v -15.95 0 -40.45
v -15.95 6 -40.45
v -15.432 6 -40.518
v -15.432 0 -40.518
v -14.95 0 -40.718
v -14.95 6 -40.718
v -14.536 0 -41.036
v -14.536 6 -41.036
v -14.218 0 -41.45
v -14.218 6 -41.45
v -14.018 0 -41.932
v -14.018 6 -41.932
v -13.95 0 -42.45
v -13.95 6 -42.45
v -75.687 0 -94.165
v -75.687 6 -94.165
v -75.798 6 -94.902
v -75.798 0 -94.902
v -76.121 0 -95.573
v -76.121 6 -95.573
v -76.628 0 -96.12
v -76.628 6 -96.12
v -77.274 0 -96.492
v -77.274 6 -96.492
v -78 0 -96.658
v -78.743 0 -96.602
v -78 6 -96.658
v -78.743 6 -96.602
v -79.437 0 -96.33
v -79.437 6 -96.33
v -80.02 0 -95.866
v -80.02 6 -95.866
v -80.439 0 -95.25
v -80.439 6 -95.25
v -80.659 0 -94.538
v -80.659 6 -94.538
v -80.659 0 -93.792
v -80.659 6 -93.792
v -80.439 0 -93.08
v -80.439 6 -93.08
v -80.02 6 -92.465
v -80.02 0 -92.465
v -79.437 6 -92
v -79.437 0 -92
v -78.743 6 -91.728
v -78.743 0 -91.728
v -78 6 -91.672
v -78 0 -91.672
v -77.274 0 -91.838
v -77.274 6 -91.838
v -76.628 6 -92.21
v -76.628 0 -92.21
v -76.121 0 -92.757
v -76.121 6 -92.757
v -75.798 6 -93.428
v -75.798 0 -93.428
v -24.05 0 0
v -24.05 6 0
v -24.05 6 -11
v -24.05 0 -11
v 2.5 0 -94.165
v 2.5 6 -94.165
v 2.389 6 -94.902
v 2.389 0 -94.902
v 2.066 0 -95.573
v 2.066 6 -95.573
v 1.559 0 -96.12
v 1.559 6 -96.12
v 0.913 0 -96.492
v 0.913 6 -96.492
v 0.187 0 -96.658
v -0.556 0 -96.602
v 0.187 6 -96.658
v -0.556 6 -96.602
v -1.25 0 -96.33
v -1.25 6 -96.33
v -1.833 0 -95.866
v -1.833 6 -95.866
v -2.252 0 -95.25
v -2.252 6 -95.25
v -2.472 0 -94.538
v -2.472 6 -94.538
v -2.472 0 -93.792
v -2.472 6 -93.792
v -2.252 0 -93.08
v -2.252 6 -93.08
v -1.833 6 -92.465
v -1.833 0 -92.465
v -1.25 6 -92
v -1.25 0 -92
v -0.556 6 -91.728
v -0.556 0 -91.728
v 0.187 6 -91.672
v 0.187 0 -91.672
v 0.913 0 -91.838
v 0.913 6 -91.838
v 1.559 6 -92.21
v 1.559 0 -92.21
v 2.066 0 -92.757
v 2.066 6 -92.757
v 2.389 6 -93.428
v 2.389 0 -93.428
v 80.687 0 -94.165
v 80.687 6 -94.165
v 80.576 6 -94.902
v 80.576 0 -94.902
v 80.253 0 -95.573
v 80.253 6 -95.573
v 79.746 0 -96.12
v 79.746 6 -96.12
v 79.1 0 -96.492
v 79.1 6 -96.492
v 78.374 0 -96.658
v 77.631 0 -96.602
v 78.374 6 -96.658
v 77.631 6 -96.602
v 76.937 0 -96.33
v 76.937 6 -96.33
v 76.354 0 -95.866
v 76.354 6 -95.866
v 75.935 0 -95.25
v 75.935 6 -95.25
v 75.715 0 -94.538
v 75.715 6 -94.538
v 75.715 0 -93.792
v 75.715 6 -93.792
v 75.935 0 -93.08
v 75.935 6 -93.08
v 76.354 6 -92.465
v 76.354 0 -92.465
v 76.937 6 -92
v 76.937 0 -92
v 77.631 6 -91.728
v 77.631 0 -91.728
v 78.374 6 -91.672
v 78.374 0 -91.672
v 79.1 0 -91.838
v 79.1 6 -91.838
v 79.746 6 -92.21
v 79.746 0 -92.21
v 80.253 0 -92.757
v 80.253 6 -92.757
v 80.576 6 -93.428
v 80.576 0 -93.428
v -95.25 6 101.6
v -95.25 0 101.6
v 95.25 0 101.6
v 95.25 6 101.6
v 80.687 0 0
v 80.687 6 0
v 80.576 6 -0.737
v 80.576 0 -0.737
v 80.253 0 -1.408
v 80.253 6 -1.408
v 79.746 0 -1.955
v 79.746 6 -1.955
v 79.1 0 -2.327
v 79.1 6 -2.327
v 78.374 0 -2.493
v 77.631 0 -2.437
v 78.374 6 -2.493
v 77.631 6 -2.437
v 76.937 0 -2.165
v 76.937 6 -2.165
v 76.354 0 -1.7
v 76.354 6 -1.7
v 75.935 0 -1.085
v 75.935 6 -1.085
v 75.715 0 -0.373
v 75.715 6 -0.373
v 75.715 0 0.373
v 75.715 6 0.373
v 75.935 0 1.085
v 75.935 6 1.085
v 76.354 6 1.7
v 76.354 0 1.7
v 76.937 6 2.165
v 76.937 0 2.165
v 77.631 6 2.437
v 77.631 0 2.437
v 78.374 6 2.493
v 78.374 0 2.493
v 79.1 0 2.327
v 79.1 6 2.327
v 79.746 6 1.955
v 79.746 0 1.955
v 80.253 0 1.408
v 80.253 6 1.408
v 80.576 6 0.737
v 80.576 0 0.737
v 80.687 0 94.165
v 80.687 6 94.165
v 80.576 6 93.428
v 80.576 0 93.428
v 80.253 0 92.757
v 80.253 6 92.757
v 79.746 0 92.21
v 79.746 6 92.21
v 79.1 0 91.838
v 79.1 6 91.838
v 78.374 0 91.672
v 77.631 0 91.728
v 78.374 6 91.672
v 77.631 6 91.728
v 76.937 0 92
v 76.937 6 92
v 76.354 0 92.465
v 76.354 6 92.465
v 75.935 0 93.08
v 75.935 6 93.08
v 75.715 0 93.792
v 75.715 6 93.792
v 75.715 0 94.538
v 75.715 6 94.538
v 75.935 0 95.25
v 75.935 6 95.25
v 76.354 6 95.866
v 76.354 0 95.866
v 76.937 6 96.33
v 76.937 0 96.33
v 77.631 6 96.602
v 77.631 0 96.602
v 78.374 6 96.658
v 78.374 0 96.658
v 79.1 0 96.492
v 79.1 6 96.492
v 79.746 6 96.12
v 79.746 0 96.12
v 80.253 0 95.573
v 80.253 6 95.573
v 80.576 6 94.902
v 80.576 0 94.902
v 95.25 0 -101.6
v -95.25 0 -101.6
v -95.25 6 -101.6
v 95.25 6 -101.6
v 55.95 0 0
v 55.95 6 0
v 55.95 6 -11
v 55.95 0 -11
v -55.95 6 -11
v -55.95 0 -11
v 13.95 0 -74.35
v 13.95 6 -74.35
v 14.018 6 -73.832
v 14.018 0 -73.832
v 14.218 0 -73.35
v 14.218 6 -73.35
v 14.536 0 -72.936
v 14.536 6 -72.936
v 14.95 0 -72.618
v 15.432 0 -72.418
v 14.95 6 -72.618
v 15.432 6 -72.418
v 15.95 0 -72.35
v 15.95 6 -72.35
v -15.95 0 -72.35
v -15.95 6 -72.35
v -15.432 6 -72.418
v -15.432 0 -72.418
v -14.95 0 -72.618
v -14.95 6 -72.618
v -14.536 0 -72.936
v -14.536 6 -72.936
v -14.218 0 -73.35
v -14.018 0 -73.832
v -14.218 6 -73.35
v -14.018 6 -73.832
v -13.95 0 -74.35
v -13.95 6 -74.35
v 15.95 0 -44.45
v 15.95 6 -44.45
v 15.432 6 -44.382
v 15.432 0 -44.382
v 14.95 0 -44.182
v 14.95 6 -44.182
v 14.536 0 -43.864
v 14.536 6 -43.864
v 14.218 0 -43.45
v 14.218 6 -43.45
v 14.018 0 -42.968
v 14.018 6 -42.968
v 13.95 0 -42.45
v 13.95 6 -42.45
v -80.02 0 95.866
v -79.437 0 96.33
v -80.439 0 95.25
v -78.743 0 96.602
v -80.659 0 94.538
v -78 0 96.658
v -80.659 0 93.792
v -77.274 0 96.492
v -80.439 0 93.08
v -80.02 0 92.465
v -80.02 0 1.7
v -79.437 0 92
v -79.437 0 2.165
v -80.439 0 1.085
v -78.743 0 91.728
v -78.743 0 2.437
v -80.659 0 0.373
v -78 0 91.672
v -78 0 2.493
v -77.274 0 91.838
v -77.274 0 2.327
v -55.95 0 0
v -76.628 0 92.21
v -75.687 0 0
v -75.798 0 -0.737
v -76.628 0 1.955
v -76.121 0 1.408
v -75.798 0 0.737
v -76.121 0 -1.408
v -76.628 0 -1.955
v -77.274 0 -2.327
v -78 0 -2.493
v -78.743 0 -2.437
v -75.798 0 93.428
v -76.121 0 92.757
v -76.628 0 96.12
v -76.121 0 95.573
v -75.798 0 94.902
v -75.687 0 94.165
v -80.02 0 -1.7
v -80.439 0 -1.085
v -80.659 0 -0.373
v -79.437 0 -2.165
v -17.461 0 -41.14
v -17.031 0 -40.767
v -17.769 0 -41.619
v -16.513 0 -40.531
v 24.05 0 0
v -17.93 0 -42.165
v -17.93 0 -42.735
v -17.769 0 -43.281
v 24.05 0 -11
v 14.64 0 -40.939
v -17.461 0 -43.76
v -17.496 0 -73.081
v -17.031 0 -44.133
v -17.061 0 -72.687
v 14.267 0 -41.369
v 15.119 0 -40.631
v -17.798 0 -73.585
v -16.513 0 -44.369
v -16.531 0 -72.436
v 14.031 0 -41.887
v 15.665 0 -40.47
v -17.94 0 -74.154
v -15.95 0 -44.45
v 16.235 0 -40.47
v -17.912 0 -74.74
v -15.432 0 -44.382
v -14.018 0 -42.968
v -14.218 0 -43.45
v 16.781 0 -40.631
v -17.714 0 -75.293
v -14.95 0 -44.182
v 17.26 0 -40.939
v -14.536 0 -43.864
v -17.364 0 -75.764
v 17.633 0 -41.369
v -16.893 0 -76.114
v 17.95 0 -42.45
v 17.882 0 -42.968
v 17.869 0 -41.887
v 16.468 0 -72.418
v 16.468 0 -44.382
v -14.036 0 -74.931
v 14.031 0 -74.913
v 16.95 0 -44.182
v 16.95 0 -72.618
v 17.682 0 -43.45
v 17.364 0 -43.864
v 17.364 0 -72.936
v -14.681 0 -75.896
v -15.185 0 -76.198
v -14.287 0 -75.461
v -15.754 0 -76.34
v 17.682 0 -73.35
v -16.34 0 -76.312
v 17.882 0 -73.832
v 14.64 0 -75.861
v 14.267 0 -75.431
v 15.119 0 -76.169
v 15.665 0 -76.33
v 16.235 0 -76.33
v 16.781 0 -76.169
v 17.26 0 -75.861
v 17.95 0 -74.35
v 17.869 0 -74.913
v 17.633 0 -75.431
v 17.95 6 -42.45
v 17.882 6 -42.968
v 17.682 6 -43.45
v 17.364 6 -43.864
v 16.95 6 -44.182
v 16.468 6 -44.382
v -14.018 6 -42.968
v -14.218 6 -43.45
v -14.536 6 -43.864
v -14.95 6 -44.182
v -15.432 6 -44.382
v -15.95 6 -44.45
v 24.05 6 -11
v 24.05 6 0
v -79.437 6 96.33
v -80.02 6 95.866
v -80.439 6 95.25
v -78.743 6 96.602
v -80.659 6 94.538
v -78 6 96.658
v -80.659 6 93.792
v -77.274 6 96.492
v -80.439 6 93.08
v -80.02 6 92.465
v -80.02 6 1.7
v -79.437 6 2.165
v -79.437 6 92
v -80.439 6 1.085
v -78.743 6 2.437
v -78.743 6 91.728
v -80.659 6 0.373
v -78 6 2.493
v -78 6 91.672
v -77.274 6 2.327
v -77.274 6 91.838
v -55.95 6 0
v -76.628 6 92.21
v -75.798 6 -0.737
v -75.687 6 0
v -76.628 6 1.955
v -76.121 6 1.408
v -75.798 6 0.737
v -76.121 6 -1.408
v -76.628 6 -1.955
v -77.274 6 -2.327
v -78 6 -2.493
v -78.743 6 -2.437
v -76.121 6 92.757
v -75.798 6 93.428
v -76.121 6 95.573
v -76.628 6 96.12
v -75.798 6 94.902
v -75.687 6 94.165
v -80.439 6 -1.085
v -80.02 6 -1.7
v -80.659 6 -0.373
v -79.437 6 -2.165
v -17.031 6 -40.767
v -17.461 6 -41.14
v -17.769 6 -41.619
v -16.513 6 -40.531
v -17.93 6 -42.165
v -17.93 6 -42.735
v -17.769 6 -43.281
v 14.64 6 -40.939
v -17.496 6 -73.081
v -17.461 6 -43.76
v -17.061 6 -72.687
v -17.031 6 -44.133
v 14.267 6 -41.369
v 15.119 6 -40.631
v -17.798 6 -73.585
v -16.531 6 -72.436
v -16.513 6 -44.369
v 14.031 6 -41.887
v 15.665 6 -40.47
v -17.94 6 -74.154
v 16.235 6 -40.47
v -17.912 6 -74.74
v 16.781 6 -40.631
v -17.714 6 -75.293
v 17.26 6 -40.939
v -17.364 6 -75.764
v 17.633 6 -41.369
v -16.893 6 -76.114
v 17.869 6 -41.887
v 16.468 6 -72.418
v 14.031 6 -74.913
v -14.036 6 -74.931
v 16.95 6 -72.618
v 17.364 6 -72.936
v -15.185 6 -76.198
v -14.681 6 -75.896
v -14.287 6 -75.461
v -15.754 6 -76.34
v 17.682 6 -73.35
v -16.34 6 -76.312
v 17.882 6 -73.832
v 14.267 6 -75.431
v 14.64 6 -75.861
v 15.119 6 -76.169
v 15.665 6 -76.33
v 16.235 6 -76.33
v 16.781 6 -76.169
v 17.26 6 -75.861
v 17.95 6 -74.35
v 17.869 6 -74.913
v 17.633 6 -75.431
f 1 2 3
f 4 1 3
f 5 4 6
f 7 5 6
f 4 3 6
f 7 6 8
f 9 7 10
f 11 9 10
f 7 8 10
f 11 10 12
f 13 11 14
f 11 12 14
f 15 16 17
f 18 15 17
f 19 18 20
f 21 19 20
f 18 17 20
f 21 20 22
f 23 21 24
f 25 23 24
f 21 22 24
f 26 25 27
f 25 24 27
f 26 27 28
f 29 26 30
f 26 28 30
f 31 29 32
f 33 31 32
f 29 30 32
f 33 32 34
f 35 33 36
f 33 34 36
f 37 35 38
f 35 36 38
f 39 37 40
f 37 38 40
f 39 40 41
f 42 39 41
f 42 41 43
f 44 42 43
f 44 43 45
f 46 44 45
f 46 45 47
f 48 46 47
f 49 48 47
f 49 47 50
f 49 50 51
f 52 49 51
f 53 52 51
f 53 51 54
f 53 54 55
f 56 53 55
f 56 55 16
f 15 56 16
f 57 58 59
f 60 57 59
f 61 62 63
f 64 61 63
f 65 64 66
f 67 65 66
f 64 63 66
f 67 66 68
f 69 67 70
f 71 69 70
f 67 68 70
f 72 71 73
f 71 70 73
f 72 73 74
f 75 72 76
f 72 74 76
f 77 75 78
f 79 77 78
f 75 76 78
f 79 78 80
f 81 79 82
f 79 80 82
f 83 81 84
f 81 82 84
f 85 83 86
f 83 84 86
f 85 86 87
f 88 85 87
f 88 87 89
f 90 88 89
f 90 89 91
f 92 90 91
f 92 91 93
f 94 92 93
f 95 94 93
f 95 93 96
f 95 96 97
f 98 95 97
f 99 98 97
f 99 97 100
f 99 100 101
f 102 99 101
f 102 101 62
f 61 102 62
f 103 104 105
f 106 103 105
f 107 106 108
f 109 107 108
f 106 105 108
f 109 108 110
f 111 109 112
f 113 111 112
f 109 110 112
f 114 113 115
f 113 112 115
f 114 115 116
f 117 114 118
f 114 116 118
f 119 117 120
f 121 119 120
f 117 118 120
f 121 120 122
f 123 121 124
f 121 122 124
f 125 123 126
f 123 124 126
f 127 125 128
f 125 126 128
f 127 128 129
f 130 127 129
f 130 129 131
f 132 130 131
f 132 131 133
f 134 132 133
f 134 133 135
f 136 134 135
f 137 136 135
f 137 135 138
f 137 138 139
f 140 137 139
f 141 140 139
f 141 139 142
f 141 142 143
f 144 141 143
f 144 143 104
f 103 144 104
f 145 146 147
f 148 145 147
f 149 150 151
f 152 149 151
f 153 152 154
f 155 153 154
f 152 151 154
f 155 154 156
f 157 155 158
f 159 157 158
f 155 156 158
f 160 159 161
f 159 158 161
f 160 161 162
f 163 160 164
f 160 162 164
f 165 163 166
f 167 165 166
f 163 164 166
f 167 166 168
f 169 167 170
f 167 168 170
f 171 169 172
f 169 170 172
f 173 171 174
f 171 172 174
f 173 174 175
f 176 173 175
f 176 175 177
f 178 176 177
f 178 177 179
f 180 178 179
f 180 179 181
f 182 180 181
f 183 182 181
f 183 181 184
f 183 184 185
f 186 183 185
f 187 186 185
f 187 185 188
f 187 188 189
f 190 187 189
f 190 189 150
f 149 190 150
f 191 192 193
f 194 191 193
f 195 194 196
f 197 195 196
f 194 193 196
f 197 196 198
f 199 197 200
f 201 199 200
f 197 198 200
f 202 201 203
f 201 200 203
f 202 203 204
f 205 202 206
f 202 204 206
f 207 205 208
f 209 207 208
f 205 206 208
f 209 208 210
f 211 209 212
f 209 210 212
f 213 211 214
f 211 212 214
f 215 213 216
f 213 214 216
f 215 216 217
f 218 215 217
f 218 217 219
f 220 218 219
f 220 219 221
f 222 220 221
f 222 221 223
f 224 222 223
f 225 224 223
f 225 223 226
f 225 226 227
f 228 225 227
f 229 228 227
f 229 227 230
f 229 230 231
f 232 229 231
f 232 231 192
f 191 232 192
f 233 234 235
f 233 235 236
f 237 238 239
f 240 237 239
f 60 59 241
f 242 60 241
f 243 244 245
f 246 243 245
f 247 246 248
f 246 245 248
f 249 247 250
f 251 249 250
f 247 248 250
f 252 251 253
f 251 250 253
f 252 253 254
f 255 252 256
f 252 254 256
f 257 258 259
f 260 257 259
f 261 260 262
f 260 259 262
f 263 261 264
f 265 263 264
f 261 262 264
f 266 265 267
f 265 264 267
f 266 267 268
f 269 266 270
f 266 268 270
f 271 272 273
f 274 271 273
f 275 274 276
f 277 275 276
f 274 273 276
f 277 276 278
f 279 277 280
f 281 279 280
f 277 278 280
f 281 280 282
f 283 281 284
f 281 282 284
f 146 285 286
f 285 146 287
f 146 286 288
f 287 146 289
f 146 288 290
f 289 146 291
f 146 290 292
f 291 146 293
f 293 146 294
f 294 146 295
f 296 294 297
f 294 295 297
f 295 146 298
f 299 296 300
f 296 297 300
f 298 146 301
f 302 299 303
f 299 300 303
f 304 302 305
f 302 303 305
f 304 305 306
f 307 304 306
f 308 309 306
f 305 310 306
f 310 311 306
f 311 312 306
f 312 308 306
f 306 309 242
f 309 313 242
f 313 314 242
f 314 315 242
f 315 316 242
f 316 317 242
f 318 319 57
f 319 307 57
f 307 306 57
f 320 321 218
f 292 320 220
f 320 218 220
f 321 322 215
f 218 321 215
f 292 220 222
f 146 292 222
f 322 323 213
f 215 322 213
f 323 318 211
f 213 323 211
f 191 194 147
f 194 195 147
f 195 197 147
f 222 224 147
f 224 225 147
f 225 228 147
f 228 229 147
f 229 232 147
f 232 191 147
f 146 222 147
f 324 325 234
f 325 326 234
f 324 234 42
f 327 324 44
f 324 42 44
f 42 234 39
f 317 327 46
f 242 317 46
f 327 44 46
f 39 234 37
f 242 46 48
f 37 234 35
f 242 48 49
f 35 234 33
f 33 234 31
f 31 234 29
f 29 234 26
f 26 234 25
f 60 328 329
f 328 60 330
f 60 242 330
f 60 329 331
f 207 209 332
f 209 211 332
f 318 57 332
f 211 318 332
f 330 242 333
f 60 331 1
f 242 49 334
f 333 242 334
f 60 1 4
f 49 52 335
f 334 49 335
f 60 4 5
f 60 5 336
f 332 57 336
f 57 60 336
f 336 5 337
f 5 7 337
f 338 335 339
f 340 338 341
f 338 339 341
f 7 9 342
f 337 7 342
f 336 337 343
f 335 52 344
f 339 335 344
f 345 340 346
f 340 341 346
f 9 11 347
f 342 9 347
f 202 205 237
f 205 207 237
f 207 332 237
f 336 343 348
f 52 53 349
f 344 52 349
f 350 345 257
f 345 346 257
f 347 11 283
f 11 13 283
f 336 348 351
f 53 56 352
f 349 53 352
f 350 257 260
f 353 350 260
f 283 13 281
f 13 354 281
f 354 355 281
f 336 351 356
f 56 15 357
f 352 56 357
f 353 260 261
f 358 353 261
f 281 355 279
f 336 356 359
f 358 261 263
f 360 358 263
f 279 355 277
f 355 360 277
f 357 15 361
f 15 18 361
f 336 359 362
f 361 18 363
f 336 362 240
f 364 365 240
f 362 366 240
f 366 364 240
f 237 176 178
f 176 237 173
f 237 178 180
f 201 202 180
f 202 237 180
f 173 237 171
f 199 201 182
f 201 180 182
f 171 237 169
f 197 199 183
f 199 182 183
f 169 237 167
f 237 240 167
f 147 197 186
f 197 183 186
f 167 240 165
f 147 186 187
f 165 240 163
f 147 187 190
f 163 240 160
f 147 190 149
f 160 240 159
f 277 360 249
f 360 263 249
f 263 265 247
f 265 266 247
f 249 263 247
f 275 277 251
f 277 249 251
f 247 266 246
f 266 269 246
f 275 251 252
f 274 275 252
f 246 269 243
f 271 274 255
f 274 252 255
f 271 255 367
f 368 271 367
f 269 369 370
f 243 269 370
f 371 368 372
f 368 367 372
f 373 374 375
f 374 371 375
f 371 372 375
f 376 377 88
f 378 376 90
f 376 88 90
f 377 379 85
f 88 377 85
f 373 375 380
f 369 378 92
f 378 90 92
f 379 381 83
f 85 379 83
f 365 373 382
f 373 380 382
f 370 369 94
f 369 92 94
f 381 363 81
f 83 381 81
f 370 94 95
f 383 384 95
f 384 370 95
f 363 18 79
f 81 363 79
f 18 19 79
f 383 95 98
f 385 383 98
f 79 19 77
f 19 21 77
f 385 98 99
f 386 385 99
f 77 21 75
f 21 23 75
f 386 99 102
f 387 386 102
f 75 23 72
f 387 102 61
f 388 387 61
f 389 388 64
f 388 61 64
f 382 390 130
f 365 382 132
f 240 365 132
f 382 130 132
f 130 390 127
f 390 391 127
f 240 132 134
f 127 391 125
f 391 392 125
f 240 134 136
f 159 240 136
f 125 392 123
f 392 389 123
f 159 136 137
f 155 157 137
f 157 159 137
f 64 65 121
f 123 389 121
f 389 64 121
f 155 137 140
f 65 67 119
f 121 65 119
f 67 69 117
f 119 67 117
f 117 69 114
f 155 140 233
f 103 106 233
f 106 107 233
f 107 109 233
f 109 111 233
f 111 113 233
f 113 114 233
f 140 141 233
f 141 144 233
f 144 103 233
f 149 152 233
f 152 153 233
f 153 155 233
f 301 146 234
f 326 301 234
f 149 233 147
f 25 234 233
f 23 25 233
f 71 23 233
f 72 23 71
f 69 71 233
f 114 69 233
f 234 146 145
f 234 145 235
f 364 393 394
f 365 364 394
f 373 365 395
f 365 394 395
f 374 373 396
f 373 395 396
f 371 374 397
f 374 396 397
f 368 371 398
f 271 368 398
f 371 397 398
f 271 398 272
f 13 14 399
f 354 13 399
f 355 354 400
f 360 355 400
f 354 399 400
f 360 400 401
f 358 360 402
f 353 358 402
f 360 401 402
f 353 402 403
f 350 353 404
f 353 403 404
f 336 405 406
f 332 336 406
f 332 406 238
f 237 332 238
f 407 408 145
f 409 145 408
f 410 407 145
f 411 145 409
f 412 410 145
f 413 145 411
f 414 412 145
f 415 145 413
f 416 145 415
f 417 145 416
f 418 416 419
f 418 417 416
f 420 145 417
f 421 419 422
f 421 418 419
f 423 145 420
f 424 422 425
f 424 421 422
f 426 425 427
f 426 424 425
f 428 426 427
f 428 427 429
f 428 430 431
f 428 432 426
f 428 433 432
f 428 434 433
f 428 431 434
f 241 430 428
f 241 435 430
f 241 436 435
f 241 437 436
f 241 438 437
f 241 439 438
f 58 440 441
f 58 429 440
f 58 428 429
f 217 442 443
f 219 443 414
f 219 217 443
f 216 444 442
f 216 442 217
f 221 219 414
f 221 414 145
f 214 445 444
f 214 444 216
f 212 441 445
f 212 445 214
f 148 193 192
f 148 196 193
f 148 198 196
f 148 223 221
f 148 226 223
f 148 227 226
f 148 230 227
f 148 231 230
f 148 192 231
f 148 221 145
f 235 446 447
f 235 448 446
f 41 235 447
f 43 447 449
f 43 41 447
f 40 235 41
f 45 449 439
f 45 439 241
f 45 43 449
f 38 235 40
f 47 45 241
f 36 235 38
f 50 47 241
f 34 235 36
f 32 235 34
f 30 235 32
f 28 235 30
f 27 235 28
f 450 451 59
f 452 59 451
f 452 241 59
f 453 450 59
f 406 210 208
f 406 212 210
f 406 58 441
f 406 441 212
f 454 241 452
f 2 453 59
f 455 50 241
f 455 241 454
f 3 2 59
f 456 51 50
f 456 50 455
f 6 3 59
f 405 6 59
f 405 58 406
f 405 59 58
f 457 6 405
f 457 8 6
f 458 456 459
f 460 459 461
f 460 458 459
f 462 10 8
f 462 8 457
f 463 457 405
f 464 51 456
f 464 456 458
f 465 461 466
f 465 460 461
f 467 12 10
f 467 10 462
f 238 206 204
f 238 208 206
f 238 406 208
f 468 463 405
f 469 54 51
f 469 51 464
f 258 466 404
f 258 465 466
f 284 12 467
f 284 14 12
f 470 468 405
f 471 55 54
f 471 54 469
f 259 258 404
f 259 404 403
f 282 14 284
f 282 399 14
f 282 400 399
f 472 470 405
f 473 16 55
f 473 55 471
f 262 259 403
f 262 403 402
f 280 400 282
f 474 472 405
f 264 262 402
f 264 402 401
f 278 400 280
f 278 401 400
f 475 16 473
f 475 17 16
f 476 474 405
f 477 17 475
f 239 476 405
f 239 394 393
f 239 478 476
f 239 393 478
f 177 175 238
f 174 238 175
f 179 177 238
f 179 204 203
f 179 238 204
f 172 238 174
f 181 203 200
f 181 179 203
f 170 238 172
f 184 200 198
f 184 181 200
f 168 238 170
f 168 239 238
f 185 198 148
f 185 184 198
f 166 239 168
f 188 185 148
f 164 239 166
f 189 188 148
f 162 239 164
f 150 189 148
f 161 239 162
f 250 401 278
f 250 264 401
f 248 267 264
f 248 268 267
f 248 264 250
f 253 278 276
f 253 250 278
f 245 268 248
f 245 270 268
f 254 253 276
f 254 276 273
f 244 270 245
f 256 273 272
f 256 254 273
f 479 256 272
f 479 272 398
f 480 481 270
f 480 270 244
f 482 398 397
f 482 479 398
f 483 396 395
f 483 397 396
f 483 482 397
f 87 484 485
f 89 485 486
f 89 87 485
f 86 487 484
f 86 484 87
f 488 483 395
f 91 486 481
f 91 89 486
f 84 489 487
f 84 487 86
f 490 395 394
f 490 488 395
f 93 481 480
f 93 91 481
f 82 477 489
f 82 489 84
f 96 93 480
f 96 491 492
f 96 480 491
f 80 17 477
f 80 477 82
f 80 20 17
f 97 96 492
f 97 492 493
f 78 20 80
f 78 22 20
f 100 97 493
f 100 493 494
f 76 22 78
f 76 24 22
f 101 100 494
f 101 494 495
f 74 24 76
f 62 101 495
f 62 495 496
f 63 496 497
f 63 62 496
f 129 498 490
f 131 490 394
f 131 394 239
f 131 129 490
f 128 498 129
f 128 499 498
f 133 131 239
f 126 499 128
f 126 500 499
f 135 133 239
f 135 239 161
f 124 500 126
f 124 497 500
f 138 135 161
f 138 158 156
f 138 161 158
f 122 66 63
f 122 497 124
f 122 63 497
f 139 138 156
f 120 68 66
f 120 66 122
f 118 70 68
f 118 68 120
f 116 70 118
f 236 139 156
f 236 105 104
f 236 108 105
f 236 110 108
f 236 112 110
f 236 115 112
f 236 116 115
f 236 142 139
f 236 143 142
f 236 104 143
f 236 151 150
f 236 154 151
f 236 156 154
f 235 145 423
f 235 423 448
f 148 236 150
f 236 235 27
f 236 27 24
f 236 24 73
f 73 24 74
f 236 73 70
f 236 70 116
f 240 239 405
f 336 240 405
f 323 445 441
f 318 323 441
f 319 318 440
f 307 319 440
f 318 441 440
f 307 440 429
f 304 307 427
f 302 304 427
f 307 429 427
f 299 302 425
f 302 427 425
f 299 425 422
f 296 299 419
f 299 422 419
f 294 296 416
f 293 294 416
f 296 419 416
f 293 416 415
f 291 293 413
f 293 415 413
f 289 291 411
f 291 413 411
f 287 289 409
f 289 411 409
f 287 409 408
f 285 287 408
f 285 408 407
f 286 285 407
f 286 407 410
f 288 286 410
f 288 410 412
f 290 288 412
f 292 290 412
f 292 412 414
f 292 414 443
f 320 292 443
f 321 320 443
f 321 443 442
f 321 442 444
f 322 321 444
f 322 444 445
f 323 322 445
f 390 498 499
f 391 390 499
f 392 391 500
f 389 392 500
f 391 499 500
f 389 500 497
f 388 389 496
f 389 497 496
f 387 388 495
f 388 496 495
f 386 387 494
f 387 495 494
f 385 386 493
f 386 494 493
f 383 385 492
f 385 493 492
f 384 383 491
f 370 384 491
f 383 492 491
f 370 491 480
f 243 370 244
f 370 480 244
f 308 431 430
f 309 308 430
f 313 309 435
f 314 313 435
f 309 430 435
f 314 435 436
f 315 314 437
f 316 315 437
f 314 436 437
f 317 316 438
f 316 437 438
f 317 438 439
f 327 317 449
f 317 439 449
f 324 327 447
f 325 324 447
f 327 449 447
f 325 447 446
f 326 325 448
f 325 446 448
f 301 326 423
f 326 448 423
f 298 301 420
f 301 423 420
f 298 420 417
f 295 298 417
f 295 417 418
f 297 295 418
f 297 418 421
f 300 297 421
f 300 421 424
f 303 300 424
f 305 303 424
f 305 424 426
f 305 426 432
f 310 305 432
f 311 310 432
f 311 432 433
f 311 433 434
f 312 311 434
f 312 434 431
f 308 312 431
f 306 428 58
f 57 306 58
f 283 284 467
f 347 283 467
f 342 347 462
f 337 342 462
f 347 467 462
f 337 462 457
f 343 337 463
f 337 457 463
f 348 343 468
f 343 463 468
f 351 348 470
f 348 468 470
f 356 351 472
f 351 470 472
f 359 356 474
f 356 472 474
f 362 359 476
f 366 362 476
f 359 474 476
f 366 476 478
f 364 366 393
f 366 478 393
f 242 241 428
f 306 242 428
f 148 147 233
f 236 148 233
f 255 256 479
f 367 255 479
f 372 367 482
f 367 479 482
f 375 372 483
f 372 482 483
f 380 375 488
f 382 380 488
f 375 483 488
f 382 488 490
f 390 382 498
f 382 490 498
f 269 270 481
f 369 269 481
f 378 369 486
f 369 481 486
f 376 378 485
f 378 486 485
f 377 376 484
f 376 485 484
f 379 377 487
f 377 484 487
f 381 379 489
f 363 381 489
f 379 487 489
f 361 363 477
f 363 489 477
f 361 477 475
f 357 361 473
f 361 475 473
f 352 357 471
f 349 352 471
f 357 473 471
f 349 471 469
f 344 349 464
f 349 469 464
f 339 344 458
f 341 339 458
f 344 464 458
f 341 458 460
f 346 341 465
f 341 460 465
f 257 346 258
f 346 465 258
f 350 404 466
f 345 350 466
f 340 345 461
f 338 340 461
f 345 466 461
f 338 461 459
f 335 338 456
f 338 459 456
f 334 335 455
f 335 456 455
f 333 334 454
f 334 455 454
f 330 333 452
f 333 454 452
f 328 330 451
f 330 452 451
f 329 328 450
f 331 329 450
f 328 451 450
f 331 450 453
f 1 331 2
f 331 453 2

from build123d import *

# Parameters (mm, degrees)
SKETCH2_W           = 190.5
SKETCH2_H           = 203.2
BOSS_EXTRUDE1_DEPTH = 6
SKETCH5_R           = 2.5
CUT_EXTRUDE6_DEPTH  = 7
CUT_EXTRUDE7_DEPTH  = 10


with BuildPart() as part:
    # Sketch2 → Boss-Extrude1 (new body)
    with BuildSketch(Plane(origin=(0, 0, 0), x_dir=(1, 0, 0), z_dir=(0, 1, 0))):
        Rectangle(SKETCH2_W, SKETCH2_H)
    extrude(amount=BOSS_EXTRUDE1_DEPTH)

    # Sketch5 → Cut-Extrude6 (cut, through all)
    with BuildSketch(Plane(origin=(0, 6, 0), x_dir=(1, 0, 0), z_dir=(0, 1, 0))):
        with Locations((-78.187036158, 94.165073798)):
            Circle(SKETCH5_R)
        with Locations((0, 94.165073798)):
            Circle(SKETCH5_R)
        with Locations((78.187036158, 0)):
            Circle(SKETCH5_R)
        with Locations((-78.187036158, 0)):
            Circle(SKETCH5_R)
        with Locations((78.187036158, 94.165073798)):
            Circle(SKETCH5_R)
        with Locations((-78.187036158, -94.165073798)):
            Circle(SKETCH5_R)
        with Locations((78.187036158, -94.165073798)):
            Circle(SKETCH5_R)
    extrude(amount=-CUT_EXTRUDE6_DEPTH, mode=Mode.SUBTRACT)

    # Sketch6 → Cut-Extrude7 (cut)
    with BuildSketch(Plane(origin=(0, 6, 0), x_dir=(1, 0, 0), z_dir=(0, 1, 0))):
        with BuildLine():
            ThreePointArc((-13.95, 74.35), (-17.364213562, 75.764213562), (-15.95, 72.35))
            Line((-15.95, 72.35), (-15.95, 74.35))
            Line((-15.95, 74.35), (-13.95, 74.35))
        make_face()
        with BuildLine():
            Line((-15.95, 74.35), (-15.95, 72.35))
            ThreePointArc((-15.95, 72.35), (-14.535786438, 72.935786438), (-13.95, 74.35))
            Line((-13.95, 74.35), (-15.95, 74.35))
        make_face()
        with BuildLine():
            ThreePointArc((13.95, 74.35), (14.535786438, 72.935786438), (15.95, 72.35))
            Line((15.95, 72.35), (15.95, 74.35))
            Line((15.95, 74.35), (13.95, 74.35))
        make_face()
        with BuildLine():
            Line((15.95, 74.35), (15.95, 72.35))
            ThreePointArc((15.95, 72.35), (17.364213562, 72.935786438), (17.95, 74.35))
            ThreePointArc((17.95, 74.35), (15.95, 76.35), (13.95, 74.35))
            Line((13.95, 74.35), (15.95, 74.35))
        make_face()
        with BuildLine():
            Line((-15.95, 44.45), (-15.95, 42.45))
            Line((-15.95, 42.45), (-13.95, 42.45))
            ThreePointArc((-13.95, 42.45), (-14.535786438, 43.864213562), (-15.95, 44.45))
        make_face()
        with BuildLine():
            ThreePointArc((-15.95, 44.45), (-17.95, 42.45), (-15.95, 40.45))
            Line((-15.95, 40.45), (-15.95, 42.45))
            Line((-15.95, 42.45), (-15.95, 44.45))
        make_face()
        with BuildLine():
            ThreePointArc((15.95, 44.45), (14.535786438, 43.864213562), (13.95, 42.45))
            Line((13.95, 42.45), (15.95, 42.45))
            Line((15.95, 42.45), (15.95, 44.45))
        make_face()
        with BuildLine():
            Line((15.95, 42.45), (17.95, 42.45))
            ThreePointArc((17.95, 42.45), (17.364213562, 43.864213562), (15.95, 44.45))
            Line((15.95, 44.45), (15.95, 42.45))
        make_face()
        with BuildLine():
            ThreePointArc((13.95, 42.45), (15.95, 40.45), (17.95, 42.45))
            Line((17.95, 42.45), (15.95, 42.45))
            Line((15.95, 42.45), (13.95, 42.45))
        make_face()
        with BuildLine():
            Line((-15.95, 42.45), (-15.95, 40.45))
            ThreePointArc((-15.95, 40.45), (-14.535786438, 41.035786438), (-13.95, 42.45))
            Line((-13.95, 42.45), (-15.95, 42.45))
        make_face()
        Polygon((-55.95, 11), (-55.95, 0), (-24.05, 0), (-24.05, 11), (-40, 11), align=None)
        Polygon((40, 0), (55.95, 0), (55.95, 11), (40, 11), (24.05, 11), (24.05, 0), align=None)
    extrude(amount=-CUT_EXTRUDE7_DEPTH, mode=Mode.SUBTRACT)


solid = part.part
